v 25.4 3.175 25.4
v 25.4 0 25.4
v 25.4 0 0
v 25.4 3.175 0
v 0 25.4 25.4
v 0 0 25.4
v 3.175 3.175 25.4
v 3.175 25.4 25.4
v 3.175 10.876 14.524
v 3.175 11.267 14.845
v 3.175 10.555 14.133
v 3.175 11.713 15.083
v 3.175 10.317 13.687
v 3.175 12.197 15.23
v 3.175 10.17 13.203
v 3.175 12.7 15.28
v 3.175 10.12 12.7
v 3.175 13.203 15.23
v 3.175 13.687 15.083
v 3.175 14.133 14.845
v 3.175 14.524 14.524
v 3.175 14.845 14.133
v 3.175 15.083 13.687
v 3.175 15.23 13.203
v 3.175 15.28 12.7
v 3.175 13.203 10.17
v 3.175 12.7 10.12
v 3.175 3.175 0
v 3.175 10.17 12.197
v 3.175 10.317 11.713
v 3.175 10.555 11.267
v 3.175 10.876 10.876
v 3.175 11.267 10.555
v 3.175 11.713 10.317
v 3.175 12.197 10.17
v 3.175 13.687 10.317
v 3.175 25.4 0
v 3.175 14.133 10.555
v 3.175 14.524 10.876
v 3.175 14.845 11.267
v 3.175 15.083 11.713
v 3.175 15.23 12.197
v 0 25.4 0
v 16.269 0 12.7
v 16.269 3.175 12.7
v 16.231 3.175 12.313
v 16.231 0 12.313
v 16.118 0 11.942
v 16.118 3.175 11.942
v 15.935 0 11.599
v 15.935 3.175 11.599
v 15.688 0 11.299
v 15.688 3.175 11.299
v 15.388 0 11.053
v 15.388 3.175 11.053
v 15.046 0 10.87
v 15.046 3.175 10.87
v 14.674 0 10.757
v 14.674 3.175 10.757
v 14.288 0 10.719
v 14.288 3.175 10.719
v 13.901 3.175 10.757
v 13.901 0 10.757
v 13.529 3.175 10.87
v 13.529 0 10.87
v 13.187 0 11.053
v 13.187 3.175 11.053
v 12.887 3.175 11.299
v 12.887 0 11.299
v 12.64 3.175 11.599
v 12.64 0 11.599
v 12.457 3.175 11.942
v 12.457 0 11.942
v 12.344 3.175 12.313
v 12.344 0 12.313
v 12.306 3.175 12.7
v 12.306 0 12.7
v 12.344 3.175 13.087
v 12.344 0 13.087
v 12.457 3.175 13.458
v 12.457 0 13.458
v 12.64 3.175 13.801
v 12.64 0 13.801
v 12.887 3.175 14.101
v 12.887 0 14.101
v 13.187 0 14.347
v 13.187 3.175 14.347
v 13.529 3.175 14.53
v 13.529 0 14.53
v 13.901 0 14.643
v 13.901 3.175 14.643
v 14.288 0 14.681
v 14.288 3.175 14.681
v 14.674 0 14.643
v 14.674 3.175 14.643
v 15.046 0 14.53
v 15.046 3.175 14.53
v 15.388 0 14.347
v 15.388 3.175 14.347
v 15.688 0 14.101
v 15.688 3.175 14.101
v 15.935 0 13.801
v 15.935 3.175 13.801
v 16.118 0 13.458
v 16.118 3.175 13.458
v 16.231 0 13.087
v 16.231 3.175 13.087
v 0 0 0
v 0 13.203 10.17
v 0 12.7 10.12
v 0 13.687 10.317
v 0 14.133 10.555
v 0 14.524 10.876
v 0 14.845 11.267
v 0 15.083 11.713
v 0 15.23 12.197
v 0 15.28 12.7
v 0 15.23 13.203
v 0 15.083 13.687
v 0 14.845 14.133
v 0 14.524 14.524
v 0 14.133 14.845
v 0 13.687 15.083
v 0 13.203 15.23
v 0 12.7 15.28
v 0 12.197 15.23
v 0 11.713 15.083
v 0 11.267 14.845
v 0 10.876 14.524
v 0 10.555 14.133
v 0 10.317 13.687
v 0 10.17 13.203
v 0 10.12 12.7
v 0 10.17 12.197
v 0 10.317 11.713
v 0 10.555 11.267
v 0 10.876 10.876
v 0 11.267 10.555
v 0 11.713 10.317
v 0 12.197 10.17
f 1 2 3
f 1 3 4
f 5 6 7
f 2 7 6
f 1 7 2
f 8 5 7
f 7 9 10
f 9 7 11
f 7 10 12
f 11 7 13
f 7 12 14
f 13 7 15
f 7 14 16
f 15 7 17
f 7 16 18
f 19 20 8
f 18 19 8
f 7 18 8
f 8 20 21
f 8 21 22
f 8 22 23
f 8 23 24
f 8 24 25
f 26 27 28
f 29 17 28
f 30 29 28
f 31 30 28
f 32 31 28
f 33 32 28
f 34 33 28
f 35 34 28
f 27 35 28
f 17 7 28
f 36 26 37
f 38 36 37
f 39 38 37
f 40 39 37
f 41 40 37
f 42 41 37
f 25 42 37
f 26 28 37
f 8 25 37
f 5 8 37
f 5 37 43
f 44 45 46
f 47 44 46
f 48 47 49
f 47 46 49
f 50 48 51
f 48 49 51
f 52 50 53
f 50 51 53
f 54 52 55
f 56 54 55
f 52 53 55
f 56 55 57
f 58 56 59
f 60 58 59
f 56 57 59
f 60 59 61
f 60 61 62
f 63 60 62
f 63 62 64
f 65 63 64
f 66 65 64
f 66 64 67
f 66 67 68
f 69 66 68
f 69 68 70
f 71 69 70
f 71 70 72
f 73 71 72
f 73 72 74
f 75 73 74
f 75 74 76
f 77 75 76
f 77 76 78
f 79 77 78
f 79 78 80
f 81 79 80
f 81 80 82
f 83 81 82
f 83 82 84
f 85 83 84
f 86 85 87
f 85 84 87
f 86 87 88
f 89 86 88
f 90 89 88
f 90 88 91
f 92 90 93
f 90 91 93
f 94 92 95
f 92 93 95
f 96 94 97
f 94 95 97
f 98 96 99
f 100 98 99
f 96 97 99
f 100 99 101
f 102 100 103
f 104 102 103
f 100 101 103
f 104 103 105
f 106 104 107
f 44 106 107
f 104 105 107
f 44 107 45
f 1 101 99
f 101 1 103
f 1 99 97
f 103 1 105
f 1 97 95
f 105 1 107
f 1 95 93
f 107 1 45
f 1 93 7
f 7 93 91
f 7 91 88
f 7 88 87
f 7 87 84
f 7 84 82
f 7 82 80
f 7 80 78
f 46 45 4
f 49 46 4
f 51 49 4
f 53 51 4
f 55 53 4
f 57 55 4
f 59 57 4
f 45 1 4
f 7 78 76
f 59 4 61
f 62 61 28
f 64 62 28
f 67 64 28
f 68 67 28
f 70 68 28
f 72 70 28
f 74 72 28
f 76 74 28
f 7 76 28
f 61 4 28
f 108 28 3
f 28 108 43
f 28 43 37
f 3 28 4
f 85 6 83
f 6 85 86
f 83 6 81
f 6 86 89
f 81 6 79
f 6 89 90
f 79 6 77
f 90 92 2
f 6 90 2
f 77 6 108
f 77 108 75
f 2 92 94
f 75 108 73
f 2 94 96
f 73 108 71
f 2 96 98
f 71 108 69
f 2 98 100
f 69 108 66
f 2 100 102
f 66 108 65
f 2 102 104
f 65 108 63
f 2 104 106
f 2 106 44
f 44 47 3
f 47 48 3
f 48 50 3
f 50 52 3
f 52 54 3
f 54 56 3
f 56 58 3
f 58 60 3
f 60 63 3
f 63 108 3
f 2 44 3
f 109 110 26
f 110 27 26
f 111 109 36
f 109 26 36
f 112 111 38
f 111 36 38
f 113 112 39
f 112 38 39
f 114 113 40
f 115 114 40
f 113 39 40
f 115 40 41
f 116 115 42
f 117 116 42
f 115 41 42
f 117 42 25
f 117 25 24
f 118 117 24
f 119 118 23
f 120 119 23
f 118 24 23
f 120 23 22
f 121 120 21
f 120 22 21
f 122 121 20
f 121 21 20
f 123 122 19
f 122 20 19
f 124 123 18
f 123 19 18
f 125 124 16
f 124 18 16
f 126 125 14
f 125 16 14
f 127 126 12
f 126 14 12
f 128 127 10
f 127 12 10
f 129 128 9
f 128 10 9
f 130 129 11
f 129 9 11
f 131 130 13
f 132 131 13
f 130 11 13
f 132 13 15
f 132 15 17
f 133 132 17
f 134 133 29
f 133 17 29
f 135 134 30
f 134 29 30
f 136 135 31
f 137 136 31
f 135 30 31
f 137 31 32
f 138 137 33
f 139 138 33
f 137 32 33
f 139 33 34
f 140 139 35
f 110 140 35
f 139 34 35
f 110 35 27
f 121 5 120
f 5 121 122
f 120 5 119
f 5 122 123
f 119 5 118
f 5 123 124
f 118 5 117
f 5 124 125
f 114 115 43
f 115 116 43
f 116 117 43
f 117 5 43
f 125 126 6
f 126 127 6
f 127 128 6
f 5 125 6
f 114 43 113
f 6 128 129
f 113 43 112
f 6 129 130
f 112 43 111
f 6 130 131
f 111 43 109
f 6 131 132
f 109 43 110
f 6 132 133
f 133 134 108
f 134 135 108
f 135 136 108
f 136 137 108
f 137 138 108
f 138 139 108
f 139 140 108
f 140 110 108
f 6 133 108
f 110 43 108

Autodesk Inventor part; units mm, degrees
ref_plane "YZ Plane" through (0, 0, 0) normal (1, 0, 0) x (0, 1, 0)
ref_plane "XZ Plane" through (0, 0, 0) normal (0, 1, 0) x (-1, 0, 0)
ref_plane "XY Plane" through (0, 0, 0) normal (0, 0, 1) x (1, 0, 0)
sketch "Sketch1" plane through (0, 0, 0) normal (0, 0, 1) x (1, 0, 0)
  line L0 (0, 0) -> (3.175, 0)
  line L1 (3.175, 0) -> (3.175, 25.4)
  line L2 (3.175, 25.4) -> (0, 25.4)
  line L3 (0, 25.4) -> (0, 0)
  line L4 (0, 0) -> (25.4, 0)
  line L5 (25.4, 0) -> (25.4, 3.175)
  line L6 (25.4, 3.175) -> (0, 3.175)
  line L7 (0, 3.175) -> (0, 0)
  dimension "d0" = 3.175
  dimension "d1" = 25.4
  dimension "d2" = 25.4
  dimension "d3" = 3.175
extrude "Extrusion1" add sketch "Sketch1" along normal blind 25.4
sketch "Sketch2" plane through (3.175, 3.175, 0) normal (0, 1, 0) x (1, 0, 0)
  line L0 (22.225, 0) -> (0, 0) construction
  line L1 (11.1125, 0) -> (11.1125, -12.7) construction
  line L2 (11.1125, 0) -> (23.8125, 0) construction
  circle A0 centre (11.1125, -12.7) radius 1.9812
  point P0 (-3.175, 0)
  dimension "d6" = 12.7
  dimension "d7" = 90
  dimension "d8" = 3.9624
extrude "Extrusion2" cut sketch "Sketch2" against normal blind 25.4
sketch "Sketch3" plane through (3.175, 3.175, 0) normal (1, 0, 0) x (0, 0, -1)
  line L0 (0, 22.225) -> (-25.4, 22.225) construction
  circle A0 centre (-12.7, 9.525) radius 2.5797
  line L1 (-12.7, 9.525) -> (-12.7, 22.225)
  point P0 (0, -3.175)
  dimension "d11" = 5.1594
  dimension "d14" = 12.7
extrude "Extrusion3" cut sketch "Sketch3" against normal blind 25.4
properties part number "L-Bracket Bumper"
